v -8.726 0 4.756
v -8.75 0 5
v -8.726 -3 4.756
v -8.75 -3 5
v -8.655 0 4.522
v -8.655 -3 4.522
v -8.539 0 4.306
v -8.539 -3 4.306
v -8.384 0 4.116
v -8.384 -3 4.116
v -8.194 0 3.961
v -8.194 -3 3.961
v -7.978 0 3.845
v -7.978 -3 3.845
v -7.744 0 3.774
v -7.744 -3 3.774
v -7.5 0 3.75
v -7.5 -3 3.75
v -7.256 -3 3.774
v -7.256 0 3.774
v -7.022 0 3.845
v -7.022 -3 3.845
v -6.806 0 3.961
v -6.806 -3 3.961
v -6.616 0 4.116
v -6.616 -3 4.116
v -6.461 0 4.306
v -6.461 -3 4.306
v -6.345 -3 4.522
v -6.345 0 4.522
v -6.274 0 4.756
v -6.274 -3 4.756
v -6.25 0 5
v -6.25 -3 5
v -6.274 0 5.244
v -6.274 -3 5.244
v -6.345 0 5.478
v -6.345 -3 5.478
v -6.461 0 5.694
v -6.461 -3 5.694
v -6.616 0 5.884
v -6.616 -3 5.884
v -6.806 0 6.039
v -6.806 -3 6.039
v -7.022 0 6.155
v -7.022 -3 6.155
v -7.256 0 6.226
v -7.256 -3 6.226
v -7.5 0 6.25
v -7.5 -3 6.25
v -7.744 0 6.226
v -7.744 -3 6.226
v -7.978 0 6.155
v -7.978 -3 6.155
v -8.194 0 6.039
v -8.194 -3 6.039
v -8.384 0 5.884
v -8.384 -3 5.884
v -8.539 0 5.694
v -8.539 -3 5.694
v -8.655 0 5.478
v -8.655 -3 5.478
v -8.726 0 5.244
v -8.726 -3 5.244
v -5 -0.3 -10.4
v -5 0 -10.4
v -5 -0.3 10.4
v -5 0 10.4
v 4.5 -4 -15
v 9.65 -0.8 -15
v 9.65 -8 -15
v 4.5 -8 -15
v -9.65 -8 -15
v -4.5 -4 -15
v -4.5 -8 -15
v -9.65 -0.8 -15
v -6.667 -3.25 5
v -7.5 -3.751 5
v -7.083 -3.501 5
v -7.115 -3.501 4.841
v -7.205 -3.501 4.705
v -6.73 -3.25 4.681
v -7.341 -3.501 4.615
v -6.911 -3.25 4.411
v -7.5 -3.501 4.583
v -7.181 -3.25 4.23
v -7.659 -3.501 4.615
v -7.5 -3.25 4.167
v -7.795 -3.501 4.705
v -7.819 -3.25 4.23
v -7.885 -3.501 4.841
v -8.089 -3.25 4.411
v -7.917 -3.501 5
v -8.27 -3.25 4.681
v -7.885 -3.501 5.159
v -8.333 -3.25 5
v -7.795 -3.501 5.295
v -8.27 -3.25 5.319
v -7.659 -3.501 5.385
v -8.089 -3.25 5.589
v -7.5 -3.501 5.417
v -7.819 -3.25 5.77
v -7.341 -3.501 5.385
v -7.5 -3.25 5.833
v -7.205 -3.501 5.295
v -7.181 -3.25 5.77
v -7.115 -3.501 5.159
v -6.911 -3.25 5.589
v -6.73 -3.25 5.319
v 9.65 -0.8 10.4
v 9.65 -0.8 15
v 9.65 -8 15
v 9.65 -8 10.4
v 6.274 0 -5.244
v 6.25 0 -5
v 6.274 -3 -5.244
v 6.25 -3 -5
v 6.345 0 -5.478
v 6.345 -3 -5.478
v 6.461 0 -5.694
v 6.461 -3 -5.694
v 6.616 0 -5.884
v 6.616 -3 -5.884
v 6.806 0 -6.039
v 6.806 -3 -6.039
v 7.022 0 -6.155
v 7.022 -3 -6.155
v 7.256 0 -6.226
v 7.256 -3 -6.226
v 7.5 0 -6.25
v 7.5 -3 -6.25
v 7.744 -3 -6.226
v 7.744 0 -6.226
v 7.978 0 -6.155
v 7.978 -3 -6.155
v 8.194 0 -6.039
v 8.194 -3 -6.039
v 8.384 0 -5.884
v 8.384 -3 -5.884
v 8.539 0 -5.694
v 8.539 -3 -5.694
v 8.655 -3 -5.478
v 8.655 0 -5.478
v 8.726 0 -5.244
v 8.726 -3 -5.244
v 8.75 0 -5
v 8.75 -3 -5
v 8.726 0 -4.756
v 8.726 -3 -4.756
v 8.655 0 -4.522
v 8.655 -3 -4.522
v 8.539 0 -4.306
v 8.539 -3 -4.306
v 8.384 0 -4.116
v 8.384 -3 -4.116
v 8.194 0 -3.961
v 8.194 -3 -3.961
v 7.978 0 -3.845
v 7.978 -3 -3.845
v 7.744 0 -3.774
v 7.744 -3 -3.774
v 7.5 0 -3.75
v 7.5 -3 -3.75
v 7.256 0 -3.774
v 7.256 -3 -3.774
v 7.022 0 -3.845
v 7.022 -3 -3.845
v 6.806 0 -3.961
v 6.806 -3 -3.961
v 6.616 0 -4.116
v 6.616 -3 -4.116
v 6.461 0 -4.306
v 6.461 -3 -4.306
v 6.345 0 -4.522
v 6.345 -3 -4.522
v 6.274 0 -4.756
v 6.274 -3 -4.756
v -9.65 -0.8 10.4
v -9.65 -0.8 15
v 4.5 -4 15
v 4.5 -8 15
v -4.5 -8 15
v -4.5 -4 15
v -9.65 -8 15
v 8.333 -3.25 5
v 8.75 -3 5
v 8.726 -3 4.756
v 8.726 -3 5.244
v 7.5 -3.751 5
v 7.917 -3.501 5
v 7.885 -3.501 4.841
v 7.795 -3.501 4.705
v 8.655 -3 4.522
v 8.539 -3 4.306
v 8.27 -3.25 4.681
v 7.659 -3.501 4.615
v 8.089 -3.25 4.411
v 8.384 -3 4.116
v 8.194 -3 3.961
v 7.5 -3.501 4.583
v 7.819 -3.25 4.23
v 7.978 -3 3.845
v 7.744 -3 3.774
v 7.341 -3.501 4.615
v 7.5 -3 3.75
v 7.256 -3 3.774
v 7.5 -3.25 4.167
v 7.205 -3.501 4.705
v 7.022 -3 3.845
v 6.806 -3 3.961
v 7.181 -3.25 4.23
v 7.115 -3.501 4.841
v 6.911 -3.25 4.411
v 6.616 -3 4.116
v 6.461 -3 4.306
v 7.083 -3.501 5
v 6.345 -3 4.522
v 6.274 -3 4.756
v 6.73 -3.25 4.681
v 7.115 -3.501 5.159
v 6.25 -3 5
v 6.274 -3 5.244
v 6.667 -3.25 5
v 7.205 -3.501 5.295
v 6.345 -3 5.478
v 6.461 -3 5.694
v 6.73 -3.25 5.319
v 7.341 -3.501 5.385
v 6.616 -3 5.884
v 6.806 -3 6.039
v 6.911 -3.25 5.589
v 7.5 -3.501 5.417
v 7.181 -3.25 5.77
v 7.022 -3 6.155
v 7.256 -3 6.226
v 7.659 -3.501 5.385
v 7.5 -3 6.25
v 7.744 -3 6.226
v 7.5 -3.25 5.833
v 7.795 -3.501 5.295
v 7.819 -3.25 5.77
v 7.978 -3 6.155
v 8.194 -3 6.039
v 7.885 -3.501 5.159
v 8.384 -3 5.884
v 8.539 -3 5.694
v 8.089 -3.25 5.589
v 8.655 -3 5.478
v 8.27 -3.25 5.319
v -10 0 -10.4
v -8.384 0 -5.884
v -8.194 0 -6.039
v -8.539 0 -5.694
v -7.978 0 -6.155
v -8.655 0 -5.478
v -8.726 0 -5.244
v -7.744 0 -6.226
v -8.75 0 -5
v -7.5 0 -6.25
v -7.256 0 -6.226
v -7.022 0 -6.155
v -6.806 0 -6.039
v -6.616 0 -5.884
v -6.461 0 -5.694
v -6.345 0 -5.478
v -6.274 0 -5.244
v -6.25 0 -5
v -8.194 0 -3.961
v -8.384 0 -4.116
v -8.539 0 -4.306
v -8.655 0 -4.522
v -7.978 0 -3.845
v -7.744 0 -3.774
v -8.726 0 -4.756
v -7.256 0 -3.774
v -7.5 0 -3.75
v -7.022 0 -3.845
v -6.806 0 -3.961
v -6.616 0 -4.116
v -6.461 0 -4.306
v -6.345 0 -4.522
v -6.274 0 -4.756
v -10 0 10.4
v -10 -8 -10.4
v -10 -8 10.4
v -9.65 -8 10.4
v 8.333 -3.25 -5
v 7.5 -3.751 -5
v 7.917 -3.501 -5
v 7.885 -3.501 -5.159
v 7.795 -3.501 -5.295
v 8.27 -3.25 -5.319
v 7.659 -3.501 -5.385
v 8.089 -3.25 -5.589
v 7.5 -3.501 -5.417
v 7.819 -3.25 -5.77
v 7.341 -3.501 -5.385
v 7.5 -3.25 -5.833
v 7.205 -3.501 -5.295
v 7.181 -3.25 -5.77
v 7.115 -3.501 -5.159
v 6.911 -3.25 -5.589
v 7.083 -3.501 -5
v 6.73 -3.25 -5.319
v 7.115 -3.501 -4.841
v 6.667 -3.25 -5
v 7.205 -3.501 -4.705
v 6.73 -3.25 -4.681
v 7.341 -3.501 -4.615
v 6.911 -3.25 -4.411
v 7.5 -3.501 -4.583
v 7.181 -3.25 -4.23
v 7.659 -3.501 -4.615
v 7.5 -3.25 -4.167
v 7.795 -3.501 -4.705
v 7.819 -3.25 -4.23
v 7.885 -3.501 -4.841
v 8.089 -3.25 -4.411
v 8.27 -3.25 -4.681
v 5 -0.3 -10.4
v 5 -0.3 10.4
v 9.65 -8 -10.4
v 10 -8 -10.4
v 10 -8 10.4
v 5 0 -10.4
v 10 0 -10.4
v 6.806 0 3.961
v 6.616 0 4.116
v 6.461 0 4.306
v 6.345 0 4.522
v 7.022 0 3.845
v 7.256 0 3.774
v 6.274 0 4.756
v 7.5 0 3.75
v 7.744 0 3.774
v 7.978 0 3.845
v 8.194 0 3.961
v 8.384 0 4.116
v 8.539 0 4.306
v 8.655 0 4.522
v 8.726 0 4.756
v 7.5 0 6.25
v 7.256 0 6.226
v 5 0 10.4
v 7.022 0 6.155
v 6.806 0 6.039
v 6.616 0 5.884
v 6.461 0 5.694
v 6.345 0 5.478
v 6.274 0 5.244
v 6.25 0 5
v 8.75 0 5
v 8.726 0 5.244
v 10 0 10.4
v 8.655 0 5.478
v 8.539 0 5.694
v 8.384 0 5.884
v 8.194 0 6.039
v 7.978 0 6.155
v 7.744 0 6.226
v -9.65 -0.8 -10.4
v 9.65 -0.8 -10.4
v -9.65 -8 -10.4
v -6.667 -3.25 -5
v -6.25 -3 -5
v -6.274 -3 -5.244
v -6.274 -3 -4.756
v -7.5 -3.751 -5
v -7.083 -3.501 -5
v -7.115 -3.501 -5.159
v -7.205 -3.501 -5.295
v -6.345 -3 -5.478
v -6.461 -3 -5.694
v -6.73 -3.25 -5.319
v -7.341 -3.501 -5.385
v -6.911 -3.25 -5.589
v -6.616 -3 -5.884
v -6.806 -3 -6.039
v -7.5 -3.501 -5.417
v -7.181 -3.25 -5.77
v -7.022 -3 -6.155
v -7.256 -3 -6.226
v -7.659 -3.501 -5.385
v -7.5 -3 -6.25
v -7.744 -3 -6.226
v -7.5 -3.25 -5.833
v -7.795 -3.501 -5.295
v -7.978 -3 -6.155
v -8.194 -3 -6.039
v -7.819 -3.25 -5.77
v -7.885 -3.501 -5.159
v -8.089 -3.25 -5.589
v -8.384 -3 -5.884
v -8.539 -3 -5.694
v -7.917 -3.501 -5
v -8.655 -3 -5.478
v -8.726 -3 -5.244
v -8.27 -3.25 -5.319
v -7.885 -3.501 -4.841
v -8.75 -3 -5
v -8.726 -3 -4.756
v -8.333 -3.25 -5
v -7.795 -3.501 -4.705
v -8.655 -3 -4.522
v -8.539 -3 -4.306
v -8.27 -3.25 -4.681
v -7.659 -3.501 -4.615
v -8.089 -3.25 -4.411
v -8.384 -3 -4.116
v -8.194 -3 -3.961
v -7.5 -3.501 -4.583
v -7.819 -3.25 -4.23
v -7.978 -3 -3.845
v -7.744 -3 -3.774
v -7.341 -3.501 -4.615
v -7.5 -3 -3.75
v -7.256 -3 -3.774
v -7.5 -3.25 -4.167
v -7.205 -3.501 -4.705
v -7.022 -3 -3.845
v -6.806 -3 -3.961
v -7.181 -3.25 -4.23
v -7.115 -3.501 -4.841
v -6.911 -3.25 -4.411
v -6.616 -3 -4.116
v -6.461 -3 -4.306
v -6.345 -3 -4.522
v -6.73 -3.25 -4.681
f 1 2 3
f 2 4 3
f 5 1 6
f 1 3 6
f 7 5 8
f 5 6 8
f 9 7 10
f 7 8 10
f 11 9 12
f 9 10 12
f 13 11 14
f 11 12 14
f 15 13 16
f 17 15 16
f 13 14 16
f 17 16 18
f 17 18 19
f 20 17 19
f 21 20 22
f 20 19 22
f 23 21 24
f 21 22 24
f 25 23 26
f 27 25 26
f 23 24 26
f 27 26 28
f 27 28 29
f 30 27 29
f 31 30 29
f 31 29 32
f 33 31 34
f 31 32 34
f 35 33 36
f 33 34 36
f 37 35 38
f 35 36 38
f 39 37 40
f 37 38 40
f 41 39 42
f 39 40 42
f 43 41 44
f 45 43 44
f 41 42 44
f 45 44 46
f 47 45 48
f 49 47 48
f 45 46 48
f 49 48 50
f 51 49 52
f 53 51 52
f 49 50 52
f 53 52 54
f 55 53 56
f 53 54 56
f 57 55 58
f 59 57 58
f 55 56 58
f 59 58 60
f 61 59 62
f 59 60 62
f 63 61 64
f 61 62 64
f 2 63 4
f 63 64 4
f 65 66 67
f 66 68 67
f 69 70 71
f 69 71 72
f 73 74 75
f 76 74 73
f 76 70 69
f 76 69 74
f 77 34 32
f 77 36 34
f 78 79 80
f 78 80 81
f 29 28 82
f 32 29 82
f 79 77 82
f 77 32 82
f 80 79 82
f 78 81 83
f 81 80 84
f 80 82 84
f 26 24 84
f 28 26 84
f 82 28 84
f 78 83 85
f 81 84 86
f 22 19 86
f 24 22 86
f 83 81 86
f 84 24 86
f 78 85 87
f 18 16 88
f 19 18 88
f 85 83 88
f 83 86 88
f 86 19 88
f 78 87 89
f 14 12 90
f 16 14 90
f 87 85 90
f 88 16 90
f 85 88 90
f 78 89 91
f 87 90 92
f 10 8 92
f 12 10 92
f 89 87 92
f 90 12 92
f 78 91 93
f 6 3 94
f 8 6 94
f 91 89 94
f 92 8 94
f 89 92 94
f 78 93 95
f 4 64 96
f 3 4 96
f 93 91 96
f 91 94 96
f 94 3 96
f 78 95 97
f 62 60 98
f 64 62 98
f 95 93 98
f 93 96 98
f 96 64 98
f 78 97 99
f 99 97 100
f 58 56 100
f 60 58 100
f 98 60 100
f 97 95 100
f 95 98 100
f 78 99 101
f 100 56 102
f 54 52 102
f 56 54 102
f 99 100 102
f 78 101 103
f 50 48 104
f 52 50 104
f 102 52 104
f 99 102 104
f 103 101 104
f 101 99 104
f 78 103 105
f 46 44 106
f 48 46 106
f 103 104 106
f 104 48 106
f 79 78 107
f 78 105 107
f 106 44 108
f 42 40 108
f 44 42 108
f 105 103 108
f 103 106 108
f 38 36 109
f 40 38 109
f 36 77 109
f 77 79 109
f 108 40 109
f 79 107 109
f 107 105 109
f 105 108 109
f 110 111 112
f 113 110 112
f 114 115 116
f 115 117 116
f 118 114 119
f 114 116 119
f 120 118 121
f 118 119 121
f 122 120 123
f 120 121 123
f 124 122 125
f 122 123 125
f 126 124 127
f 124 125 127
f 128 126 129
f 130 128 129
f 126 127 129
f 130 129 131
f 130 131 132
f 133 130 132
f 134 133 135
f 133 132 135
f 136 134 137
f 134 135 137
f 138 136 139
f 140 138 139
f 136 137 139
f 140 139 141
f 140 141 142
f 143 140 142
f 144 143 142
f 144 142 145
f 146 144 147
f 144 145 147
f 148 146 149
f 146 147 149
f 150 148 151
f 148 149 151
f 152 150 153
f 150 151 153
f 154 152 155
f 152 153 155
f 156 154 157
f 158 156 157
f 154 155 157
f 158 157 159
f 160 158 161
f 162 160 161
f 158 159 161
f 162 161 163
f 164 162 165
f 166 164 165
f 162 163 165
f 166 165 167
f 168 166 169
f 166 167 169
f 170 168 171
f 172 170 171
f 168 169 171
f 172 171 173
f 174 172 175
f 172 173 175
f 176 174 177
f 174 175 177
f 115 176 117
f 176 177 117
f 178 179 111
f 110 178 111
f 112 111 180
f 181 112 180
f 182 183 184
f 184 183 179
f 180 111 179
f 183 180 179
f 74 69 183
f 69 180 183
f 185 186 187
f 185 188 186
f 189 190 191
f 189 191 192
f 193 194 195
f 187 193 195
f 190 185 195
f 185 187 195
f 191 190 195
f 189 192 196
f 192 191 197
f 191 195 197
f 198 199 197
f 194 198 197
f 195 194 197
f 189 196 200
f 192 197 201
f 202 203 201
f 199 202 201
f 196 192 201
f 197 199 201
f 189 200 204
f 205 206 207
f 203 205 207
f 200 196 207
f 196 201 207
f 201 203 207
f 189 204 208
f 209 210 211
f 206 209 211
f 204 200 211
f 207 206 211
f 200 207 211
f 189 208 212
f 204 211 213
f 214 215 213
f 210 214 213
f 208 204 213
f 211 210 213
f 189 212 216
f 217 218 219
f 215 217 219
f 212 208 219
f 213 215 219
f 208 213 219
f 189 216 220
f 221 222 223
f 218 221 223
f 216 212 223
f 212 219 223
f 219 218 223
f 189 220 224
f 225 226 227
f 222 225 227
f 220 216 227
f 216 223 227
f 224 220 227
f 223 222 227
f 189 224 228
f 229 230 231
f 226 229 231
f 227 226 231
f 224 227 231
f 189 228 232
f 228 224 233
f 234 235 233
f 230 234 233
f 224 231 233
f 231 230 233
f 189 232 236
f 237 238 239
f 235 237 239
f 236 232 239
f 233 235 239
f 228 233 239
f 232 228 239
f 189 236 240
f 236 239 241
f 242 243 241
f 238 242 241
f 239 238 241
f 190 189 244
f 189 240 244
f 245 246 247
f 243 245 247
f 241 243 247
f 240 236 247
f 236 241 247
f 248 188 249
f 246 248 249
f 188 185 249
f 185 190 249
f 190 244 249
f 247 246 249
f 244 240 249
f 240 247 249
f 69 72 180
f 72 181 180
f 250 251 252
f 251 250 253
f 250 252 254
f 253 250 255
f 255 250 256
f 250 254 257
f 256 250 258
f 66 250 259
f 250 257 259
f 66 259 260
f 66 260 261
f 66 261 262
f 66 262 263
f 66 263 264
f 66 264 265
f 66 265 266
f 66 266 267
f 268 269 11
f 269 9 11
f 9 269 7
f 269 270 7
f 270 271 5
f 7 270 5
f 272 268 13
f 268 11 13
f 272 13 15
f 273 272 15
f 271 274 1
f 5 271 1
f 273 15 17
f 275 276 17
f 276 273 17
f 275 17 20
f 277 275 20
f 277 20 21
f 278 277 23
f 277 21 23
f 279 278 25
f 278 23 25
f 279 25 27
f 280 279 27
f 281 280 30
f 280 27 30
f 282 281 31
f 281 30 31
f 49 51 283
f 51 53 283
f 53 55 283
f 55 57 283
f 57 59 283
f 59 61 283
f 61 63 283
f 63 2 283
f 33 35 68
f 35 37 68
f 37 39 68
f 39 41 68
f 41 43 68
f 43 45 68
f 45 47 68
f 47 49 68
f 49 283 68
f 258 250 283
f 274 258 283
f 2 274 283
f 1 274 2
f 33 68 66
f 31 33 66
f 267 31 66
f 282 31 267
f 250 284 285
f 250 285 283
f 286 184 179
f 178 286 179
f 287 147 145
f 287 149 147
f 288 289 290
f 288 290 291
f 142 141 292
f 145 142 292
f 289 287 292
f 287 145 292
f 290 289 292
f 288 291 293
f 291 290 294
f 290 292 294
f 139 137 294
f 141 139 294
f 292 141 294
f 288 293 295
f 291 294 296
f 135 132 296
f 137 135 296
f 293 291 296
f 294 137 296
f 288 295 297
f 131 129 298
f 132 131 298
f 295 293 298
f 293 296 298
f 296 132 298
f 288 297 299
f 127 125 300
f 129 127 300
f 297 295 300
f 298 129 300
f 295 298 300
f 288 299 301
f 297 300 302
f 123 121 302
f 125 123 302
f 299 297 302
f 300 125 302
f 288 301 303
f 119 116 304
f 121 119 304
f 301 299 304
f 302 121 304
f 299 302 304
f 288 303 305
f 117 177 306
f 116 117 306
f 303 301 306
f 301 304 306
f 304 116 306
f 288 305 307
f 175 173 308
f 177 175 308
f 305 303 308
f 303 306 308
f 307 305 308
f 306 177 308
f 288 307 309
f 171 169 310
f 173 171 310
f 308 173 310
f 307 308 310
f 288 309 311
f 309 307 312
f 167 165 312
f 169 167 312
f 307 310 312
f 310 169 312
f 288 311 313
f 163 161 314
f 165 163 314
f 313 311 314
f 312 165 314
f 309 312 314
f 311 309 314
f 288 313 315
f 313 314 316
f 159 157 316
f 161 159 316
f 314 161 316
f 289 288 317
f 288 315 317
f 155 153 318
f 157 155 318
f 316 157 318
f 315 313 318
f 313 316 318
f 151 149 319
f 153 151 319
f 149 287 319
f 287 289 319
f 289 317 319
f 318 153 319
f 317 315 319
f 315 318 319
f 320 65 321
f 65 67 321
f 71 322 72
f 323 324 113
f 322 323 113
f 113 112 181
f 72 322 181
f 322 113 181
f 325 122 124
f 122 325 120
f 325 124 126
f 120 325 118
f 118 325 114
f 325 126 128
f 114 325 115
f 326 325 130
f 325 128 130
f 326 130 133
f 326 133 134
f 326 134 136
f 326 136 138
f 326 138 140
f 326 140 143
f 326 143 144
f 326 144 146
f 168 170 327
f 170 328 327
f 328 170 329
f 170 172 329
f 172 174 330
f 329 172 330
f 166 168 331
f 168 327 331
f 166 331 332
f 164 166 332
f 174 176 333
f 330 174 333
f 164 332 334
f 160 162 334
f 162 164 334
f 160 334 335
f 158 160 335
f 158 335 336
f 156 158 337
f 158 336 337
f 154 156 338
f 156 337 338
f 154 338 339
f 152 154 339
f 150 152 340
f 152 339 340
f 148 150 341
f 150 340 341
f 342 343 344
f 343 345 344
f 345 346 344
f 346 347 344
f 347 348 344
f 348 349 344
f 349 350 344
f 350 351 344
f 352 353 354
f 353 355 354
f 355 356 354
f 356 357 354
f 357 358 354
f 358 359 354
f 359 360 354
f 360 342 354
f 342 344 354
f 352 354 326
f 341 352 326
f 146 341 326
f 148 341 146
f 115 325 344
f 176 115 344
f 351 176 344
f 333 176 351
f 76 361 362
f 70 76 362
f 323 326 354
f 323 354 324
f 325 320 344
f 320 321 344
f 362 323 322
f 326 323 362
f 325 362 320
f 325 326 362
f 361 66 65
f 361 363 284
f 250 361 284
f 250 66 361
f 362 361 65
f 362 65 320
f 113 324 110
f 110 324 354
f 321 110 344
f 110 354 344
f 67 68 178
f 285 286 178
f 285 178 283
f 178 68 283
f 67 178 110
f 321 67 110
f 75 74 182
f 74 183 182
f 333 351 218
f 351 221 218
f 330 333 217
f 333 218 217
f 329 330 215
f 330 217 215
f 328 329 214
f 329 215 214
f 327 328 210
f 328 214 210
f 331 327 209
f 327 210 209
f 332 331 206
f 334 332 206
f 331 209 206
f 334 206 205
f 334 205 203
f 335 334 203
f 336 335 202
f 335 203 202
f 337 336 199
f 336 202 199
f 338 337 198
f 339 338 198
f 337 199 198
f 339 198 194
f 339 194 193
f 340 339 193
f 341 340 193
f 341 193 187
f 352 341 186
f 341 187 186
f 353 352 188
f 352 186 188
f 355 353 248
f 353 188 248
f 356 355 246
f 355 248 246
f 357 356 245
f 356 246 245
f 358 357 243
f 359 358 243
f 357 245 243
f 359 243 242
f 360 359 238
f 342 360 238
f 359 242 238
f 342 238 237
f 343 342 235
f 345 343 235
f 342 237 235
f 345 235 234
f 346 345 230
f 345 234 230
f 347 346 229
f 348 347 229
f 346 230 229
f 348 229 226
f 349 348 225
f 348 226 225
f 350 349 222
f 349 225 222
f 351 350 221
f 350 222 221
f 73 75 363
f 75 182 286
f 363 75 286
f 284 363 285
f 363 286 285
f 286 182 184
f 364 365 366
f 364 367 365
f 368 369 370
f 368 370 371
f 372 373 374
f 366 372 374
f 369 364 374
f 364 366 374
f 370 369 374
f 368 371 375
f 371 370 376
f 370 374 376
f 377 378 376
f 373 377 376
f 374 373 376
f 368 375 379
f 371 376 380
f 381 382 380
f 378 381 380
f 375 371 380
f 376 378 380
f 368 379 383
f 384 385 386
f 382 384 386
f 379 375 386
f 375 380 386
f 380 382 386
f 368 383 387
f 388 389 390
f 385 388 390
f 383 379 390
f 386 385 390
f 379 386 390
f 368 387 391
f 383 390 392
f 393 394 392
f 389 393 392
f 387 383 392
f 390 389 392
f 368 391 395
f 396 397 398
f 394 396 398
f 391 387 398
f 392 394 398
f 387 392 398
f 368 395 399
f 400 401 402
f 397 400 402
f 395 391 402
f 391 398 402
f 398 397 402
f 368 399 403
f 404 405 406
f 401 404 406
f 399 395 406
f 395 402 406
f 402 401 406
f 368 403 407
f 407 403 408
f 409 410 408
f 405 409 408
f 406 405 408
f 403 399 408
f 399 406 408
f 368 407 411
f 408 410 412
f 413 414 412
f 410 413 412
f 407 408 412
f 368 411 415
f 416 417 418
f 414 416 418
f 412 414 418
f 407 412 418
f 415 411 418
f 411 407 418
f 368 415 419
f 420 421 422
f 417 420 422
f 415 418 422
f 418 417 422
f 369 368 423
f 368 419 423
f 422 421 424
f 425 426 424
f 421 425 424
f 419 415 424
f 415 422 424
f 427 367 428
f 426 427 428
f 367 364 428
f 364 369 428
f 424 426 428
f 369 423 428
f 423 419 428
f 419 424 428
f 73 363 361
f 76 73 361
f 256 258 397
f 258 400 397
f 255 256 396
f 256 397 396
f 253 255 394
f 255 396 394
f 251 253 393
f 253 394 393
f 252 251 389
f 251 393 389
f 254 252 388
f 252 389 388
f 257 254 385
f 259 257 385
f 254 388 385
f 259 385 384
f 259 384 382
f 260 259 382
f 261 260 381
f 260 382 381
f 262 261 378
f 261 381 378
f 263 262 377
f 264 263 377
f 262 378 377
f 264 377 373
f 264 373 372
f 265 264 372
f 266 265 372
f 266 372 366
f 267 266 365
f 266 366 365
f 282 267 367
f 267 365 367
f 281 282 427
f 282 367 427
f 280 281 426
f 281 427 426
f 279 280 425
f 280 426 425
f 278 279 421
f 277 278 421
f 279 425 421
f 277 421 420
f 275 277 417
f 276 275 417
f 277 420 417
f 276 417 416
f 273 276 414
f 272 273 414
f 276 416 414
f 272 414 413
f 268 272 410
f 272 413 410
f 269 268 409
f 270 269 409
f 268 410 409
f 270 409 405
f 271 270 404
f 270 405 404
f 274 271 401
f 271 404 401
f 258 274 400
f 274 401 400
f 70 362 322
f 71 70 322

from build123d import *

# Parameters (mm, degrees)
BOSS_EXTRUDE1_DEPTH         = 10.4
BOSS_EXTRUDE2_DEPTH         = 15
TAP_DRILL_FOR_M3_TAP1_D     = 2.5
TAP_DRILL_FOR_M3_TAP1_DEPTH = 3
TAP_DRILL_FOR_M3_TAP1_TIP   = 0.751075774


with BuildPart() as part:
    # Sketch1 → Boss-Extrude1 (new, symmetric)
    with BuildSketch(Plane.XY):
        Polygon((-10, 0), (-5, 0), (-5, -0.3), (5, -0.3), (5, 0), (10, 0), (10, -8), (4.5, -8), (4.5, -4), (-4.5, -4), (-4.5, -8), (-10, -8), align=None)
    extrude(amount=BOSS_EXTRUDE1_DEPTH, both=True)

    # Sketch2 → Boss-Extrude2 (add, symmetric)
    with BuildSketch(Plane.XY):
        Polygon((-9.65, -0.8), (9.65, -0.8), (9.65, -8), (4.5, -8), (4.5, -4), (-4.5, -4), (-4.5, -8), (-9.65, -8), align=None)
    extrude(amount=BOSS_EXTRUDE2_DEPTH, both=True)

    # Tap Drill for M3 Tap1
    with Locations(Plane(origin=(0, 0, 0), x_dir=(1, 0, 0), z_dir=(0, 1, 0))):
        with Locations((7.5, 5), (7.5, -5), (-7.5, 5), (-7.5, -5)):
            Hole(TAP_DRILL_FOR_M3_TAP1_D / 2, depth=TAP_DRILL_FOR_M3_TAP1_DEPTH)
            with Locations((0, 0, -(TAP_DRILL_FOR_M3_TAP1_DEPTH + TAP_DRILL_FOR_M3_TAP1_TIP / 2))):  # 118° drill point
                Cone(0, TAP_DRILL_FOR_M3_TAP1_D / 2, TAP_DRILL_FOR_M3_TAP1_TIP, mode=Mode.SUBTRACT)


solid = part.part
